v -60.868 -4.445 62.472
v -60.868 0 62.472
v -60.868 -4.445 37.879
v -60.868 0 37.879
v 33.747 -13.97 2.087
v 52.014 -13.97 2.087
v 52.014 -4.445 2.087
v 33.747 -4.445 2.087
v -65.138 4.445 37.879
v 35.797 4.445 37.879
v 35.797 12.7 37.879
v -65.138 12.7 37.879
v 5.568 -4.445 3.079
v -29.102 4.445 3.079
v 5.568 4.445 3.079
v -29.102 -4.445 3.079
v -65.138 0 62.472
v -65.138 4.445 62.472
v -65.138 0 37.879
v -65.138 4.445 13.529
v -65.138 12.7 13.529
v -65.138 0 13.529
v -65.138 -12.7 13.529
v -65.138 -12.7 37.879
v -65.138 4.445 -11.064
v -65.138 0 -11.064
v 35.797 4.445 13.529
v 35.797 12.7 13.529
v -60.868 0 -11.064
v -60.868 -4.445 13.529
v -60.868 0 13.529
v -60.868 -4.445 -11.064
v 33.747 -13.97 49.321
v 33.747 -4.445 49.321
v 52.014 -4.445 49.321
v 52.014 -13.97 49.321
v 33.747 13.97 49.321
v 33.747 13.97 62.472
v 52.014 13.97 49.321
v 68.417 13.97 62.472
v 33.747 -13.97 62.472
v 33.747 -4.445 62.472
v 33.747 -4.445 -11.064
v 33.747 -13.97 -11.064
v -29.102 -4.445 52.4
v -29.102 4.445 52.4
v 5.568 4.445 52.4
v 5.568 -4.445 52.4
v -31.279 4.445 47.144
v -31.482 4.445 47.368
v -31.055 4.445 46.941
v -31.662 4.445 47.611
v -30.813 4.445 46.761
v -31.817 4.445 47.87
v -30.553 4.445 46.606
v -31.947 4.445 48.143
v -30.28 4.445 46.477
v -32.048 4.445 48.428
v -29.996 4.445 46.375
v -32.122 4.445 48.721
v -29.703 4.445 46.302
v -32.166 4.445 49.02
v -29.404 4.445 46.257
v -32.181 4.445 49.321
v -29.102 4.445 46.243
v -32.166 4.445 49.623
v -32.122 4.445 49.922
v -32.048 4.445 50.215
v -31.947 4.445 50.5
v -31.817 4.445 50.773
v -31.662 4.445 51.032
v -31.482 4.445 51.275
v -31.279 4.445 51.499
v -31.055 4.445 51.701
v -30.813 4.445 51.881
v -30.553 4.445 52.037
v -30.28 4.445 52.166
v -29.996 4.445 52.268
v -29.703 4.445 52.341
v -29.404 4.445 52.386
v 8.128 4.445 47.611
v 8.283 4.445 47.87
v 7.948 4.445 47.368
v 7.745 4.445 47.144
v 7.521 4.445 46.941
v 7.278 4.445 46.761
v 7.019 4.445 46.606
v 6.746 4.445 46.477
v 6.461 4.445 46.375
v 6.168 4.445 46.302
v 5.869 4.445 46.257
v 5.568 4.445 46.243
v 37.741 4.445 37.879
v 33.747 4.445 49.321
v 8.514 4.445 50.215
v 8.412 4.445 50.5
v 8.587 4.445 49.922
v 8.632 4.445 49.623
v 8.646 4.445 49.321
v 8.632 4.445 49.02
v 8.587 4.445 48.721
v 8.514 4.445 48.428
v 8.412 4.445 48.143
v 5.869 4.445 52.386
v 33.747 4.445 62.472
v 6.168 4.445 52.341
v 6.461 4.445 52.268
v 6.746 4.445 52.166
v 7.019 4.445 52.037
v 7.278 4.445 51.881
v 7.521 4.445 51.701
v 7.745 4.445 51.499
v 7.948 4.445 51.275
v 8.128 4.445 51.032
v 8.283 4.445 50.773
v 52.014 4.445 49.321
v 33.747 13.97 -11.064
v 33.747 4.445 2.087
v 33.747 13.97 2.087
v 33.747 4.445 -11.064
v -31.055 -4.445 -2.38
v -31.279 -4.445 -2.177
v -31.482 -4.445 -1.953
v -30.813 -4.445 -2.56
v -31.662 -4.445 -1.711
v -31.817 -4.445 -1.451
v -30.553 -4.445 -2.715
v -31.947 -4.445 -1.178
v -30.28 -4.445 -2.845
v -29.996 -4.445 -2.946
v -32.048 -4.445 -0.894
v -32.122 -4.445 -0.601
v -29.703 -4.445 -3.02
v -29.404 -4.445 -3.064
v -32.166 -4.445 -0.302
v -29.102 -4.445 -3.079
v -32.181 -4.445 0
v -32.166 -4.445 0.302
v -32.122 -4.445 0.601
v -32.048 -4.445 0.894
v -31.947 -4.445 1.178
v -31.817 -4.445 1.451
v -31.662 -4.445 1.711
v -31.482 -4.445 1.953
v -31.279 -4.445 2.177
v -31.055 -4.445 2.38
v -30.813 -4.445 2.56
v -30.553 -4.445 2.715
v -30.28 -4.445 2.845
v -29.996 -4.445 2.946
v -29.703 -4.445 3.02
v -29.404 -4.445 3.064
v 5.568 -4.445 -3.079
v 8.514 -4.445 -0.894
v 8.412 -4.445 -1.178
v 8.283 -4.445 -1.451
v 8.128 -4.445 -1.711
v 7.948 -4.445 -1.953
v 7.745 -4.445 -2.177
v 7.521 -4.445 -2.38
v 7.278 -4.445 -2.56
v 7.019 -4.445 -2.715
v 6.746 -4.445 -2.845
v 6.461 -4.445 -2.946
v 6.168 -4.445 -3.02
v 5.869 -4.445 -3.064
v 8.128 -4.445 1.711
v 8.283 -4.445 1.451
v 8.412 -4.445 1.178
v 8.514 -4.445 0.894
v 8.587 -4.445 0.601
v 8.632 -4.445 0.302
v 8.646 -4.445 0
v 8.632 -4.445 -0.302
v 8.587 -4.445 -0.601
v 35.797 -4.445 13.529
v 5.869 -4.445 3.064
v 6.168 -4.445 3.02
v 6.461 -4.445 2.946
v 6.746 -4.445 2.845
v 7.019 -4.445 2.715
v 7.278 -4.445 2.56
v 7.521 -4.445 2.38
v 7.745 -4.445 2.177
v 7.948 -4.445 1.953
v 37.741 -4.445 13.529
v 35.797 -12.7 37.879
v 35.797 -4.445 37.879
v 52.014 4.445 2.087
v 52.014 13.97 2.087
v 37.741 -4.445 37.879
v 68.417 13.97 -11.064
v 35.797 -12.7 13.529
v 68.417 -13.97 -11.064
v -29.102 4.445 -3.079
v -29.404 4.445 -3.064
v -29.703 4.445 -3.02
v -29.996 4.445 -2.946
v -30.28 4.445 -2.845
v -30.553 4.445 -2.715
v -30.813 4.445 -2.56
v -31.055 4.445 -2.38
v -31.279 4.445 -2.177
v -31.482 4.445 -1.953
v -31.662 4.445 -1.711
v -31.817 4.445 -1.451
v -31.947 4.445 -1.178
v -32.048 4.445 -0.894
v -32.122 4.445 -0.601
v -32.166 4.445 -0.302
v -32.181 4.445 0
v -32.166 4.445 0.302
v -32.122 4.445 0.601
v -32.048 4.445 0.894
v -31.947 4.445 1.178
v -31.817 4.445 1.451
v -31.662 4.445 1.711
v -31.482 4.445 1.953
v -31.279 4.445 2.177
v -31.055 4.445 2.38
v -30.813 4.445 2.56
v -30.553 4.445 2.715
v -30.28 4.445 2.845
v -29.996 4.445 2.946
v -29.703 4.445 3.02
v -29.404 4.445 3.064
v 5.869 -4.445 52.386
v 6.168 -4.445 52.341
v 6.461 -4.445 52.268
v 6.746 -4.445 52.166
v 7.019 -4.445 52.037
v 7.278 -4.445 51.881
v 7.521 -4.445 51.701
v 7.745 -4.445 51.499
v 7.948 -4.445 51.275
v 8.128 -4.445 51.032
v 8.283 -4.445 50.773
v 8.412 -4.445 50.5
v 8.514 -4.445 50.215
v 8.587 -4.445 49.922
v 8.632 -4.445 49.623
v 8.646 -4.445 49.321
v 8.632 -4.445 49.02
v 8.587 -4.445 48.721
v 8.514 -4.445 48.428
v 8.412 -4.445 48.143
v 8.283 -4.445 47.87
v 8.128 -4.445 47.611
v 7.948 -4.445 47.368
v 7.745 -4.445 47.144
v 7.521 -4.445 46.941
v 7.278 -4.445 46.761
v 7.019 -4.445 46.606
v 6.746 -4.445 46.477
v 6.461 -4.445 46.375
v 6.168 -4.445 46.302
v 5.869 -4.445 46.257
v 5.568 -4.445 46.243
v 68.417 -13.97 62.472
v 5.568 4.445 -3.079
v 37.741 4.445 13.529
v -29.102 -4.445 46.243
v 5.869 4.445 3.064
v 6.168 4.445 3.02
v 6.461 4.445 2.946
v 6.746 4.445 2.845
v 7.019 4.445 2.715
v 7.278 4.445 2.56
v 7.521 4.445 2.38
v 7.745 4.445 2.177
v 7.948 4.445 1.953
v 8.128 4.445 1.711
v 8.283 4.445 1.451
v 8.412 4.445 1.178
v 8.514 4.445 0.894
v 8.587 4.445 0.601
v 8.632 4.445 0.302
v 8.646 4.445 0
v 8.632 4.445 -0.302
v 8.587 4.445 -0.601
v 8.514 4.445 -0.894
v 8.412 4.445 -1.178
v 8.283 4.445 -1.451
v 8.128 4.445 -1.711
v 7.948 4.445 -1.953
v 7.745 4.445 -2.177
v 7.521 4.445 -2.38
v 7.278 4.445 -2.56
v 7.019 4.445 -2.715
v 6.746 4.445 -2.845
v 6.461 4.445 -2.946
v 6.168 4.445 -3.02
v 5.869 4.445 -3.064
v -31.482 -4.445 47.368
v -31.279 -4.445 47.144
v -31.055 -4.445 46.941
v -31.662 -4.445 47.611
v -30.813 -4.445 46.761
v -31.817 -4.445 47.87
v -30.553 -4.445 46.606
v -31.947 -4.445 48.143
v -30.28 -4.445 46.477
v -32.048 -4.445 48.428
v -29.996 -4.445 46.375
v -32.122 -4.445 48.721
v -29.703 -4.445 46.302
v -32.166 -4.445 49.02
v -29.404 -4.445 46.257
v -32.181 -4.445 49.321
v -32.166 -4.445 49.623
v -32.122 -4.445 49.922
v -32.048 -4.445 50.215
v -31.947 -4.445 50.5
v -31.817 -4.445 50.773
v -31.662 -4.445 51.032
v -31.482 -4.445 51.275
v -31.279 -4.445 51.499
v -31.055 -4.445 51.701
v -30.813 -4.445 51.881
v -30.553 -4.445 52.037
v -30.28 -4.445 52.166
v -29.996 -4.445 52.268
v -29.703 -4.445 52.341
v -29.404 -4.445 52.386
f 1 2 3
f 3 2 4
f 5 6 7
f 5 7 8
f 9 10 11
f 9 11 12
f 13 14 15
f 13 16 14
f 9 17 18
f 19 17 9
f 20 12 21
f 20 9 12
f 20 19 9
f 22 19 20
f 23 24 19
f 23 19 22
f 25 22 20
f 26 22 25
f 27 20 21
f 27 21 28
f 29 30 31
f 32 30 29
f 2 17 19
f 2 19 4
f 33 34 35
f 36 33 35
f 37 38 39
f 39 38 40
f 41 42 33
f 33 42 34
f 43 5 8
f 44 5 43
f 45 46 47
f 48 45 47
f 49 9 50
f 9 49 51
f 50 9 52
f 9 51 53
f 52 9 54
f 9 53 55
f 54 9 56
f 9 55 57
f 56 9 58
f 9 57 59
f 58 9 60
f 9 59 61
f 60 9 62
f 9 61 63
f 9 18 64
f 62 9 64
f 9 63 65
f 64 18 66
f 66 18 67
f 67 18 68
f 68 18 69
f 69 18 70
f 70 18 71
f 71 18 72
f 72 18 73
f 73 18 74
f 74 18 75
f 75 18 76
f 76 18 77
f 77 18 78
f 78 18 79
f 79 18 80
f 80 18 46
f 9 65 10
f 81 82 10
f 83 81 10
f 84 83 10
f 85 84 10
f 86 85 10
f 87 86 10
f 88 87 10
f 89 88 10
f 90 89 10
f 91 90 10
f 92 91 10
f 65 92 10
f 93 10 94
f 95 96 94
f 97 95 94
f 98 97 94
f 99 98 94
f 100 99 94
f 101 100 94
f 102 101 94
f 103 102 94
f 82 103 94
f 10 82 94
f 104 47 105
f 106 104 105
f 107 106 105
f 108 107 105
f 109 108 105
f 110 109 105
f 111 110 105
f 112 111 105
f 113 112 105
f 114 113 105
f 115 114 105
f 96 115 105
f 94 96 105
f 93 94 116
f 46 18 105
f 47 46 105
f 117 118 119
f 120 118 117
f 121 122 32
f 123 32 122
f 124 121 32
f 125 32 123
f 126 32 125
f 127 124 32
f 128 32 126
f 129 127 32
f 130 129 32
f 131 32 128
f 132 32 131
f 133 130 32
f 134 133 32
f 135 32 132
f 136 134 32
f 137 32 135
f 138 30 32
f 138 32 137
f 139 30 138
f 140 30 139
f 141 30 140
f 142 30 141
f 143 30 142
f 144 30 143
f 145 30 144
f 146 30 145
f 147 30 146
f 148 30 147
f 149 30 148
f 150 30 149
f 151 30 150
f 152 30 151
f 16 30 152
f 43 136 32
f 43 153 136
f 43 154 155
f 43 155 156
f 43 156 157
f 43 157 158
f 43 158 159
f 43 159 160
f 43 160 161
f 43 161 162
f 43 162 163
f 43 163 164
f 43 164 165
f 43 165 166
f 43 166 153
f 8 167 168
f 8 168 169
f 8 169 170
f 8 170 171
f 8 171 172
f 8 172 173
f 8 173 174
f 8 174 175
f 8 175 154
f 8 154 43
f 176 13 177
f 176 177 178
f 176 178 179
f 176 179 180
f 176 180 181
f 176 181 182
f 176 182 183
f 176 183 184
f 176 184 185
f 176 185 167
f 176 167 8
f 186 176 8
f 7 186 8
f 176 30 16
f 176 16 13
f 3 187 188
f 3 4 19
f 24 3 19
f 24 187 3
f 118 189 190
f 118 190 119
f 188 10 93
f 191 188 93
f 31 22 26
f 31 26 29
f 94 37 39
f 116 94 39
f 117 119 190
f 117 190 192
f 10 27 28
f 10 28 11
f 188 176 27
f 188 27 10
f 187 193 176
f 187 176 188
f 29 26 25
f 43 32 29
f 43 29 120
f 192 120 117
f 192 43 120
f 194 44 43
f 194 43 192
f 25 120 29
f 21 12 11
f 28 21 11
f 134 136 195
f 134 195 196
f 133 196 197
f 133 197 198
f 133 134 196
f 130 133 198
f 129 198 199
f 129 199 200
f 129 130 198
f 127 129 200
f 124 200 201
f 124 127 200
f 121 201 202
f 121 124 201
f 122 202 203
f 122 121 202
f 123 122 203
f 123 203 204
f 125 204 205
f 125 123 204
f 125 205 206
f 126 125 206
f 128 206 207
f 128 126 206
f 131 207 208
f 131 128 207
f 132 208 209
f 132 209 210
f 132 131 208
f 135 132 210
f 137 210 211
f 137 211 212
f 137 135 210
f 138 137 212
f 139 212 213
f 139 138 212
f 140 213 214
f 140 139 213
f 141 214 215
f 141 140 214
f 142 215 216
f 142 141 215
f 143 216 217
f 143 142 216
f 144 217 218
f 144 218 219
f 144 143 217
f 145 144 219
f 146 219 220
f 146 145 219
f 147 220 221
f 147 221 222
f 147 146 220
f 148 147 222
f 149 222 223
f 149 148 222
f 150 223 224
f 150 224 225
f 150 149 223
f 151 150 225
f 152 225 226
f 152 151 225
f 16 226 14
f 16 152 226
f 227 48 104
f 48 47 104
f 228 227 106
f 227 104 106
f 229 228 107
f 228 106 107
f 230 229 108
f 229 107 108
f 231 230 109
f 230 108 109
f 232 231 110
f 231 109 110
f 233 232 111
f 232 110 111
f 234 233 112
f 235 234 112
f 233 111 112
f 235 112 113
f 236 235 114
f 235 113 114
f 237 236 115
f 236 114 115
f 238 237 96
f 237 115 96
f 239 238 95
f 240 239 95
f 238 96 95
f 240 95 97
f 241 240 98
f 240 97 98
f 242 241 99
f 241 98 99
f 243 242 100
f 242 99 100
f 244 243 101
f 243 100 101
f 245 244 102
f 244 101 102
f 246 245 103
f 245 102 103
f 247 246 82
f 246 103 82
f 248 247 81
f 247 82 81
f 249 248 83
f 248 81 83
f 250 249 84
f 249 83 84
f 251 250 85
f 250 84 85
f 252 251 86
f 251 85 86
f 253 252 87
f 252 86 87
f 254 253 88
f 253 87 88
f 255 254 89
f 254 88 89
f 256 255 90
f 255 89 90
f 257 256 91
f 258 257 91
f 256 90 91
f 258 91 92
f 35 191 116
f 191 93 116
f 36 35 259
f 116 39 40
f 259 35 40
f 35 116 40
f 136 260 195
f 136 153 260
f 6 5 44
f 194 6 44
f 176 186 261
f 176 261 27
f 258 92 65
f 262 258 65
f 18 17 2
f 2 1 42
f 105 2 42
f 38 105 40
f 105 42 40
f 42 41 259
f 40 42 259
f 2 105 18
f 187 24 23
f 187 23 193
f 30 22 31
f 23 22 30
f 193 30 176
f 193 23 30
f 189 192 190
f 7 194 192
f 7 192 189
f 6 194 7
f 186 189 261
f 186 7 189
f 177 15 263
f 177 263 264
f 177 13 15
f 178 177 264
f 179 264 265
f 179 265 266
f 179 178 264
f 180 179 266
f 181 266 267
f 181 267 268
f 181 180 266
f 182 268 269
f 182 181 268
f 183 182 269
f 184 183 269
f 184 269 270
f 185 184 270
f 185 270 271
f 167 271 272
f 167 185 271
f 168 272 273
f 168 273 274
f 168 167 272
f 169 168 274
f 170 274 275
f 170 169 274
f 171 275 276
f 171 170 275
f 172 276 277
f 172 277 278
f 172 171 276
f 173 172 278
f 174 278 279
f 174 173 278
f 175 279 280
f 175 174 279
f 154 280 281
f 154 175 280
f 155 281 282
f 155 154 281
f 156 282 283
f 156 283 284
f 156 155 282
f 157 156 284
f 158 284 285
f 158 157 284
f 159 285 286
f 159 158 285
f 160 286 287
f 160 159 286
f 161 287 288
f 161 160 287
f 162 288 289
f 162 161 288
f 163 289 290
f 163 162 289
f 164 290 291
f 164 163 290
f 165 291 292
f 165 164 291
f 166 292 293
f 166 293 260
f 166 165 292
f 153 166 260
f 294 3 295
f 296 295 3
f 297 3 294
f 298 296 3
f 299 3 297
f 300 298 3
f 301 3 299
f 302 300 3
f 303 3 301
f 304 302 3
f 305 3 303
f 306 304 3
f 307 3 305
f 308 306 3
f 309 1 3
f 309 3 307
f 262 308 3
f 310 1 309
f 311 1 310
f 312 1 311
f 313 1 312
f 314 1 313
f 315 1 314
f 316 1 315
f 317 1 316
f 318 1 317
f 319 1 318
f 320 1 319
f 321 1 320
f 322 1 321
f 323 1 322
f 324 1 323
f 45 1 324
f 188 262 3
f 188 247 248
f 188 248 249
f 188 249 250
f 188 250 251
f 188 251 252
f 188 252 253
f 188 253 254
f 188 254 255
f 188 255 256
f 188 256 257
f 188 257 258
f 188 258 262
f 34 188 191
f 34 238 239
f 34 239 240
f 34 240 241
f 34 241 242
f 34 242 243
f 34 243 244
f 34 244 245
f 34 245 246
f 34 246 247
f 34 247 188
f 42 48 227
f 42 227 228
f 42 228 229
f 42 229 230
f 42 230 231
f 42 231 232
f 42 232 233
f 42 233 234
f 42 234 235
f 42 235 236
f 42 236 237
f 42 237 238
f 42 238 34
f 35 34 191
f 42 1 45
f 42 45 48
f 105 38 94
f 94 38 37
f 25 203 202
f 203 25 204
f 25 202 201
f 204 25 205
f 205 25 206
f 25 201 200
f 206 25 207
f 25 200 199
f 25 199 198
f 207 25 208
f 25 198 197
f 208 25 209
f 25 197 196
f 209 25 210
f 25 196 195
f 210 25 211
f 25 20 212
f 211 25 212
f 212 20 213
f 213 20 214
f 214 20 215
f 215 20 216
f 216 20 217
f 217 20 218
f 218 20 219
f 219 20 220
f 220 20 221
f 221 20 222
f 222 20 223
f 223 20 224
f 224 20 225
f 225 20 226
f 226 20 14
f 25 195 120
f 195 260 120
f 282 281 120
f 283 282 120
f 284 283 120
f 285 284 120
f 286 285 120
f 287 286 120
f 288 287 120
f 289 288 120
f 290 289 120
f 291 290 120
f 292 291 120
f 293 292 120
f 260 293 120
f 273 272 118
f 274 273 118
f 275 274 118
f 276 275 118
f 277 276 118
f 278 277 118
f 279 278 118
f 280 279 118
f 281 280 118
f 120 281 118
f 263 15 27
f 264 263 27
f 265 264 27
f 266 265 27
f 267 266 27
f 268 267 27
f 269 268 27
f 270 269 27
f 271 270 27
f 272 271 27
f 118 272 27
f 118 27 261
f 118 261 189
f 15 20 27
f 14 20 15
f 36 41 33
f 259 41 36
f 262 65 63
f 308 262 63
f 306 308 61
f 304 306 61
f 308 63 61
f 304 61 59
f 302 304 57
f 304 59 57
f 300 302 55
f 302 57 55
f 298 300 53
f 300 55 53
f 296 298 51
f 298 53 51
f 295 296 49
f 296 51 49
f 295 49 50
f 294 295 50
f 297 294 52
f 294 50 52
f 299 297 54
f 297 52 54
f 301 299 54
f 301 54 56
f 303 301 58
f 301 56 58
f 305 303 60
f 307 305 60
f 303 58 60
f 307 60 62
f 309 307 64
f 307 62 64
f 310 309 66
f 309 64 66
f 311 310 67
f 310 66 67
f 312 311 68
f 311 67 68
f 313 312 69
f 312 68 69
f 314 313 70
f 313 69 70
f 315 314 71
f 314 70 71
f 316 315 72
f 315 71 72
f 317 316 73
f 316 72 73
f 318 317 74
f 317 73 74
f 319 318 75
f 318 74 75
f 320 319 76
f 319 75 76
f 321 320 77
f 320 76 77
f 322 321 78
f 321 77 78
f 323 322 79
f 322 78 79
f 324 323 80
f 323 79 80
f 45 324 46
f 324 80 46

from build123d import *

# Parameters (mm, degrees)
F1_DEPTH = 12.7
F0_W     = 4.2696557939
F0_H     = 24.5932303369
F2_DEPTH = 4.445
F3_DEPTH = 4.445
F4_DEPTH = 13.97


with BuildPart() as f1:
    # F0 (on Front) → F1 (new body, symmetric)
    with BuildSketch(Plane.XZ):
        Polygon((-60.8683489263, 37.8787778318), (-65.1380047202, 37.8787778318), (-65.1380047202, 25.7041221485), (35.7967093587, 25.7041221485), (35.7967093587, 37.8787778318), align=None)
        Polygon((35.7967093587, 25.7041221485), (-65.1380047202, 25.7041221485), (-65.1380047202, 13.5294664651), (-60.8683489263, 13.5294664651), (35.7967093587, 13.5294664651), align=None)
    extrude(amount=F1_DEPTH, both=True)

    # F0 (on Front) → F2 (join)
    with BuildSketch(Plane.XZ):
        with Locations((-63.0031768233, 50.1753930002)):
            Rectangle(F0_W, F0_H)
        with Locations((-63.0031768233, 1.2328512967)):
            Rectangle(F0_W, F0_H)
    extrude(amount=-F2_DEPTH)

    # F0 (on Front) → F3 (join, symmetric)
    with BuildSketch(Plane.XZ):
        Polygon((33.7472744286, 62.4720081687), (-60.8683489263, 62.4720081687), (-60.8683489263, 37.8787778318), (35.7967093587, 37.8787778318), (37.7412438393, 37.8787778318), (52.0139420338, 49.3214614689), (33.7472744286, 49.3214614689), align=None)
        with BuildLine():
            ThreePointArc((5.5675311014, 52.4003553908), (8.6464250233, 49.3214614689), (5.5675311014, 46.2425675471))
            Line((5.5675311014, 46.2425675471), (-29.1020926088, 46.2425675471))
            ThreePointArc((-29.1020926088, 46.2425675471), (-32.1809865307, 49.3214614689), (-29.1020926088, 52.4003553908))
            Line((-29.1020926088, 52.4003553908), (5.5675311014, 52.4003553908))
        make_face(mode=Mode.SUBTRACT)
        Polygon((37.7412438393, 13.5294664651), (35.7967093587, 13.5294664651), (-60.8683489263, 13.5294664651), (-60.8683489263, -11.0637638718), (33.7472744286, -11.0637638718), (33.7472744286, 2.086782828), (52.0139420338, 2.086782828), align=None)
        with BuildLine():
            ThreePointArc((-29.1020926088, -3.0788939219), (-32.1809865307, 0), (-29.1020926088, 3.0788939219))
            Line((-29.1020926088, 3.0788939219), (5.5675311014, 3.0788939219))
            ThreePointArc((5.5675311014, 3.0788939219), (8.6464250233, 0), (5.5675311014, -3.0788939219))
            Line((5.5675311014, -3.0788939219), (-29.1020926088, -3.0788939219))
        make_face(mode=Mode.SUBTRACT)
    extrude(amount=F3_DEPTH, both=True)

    # F0 (on Front) → F4 (join, symmetric)
    with BuildSketch(Plane.XZ):
        Polygon((68.4168934822, 62.4720081687), (33.7472744286, 62.4720081687), (33.7472744286, 49.3214614689), (52.0139420338, 49.3214614689), align=None)
        Polygon((68.4168934822, -11.0637638718), (52.0139420338, 2.086782828), (33.7472744286, 2.086782828), (33.7472744286, -11.0637638718), align=None)
    extrude(amount=F4_DEPTH, both=True)


solid = f1.part
